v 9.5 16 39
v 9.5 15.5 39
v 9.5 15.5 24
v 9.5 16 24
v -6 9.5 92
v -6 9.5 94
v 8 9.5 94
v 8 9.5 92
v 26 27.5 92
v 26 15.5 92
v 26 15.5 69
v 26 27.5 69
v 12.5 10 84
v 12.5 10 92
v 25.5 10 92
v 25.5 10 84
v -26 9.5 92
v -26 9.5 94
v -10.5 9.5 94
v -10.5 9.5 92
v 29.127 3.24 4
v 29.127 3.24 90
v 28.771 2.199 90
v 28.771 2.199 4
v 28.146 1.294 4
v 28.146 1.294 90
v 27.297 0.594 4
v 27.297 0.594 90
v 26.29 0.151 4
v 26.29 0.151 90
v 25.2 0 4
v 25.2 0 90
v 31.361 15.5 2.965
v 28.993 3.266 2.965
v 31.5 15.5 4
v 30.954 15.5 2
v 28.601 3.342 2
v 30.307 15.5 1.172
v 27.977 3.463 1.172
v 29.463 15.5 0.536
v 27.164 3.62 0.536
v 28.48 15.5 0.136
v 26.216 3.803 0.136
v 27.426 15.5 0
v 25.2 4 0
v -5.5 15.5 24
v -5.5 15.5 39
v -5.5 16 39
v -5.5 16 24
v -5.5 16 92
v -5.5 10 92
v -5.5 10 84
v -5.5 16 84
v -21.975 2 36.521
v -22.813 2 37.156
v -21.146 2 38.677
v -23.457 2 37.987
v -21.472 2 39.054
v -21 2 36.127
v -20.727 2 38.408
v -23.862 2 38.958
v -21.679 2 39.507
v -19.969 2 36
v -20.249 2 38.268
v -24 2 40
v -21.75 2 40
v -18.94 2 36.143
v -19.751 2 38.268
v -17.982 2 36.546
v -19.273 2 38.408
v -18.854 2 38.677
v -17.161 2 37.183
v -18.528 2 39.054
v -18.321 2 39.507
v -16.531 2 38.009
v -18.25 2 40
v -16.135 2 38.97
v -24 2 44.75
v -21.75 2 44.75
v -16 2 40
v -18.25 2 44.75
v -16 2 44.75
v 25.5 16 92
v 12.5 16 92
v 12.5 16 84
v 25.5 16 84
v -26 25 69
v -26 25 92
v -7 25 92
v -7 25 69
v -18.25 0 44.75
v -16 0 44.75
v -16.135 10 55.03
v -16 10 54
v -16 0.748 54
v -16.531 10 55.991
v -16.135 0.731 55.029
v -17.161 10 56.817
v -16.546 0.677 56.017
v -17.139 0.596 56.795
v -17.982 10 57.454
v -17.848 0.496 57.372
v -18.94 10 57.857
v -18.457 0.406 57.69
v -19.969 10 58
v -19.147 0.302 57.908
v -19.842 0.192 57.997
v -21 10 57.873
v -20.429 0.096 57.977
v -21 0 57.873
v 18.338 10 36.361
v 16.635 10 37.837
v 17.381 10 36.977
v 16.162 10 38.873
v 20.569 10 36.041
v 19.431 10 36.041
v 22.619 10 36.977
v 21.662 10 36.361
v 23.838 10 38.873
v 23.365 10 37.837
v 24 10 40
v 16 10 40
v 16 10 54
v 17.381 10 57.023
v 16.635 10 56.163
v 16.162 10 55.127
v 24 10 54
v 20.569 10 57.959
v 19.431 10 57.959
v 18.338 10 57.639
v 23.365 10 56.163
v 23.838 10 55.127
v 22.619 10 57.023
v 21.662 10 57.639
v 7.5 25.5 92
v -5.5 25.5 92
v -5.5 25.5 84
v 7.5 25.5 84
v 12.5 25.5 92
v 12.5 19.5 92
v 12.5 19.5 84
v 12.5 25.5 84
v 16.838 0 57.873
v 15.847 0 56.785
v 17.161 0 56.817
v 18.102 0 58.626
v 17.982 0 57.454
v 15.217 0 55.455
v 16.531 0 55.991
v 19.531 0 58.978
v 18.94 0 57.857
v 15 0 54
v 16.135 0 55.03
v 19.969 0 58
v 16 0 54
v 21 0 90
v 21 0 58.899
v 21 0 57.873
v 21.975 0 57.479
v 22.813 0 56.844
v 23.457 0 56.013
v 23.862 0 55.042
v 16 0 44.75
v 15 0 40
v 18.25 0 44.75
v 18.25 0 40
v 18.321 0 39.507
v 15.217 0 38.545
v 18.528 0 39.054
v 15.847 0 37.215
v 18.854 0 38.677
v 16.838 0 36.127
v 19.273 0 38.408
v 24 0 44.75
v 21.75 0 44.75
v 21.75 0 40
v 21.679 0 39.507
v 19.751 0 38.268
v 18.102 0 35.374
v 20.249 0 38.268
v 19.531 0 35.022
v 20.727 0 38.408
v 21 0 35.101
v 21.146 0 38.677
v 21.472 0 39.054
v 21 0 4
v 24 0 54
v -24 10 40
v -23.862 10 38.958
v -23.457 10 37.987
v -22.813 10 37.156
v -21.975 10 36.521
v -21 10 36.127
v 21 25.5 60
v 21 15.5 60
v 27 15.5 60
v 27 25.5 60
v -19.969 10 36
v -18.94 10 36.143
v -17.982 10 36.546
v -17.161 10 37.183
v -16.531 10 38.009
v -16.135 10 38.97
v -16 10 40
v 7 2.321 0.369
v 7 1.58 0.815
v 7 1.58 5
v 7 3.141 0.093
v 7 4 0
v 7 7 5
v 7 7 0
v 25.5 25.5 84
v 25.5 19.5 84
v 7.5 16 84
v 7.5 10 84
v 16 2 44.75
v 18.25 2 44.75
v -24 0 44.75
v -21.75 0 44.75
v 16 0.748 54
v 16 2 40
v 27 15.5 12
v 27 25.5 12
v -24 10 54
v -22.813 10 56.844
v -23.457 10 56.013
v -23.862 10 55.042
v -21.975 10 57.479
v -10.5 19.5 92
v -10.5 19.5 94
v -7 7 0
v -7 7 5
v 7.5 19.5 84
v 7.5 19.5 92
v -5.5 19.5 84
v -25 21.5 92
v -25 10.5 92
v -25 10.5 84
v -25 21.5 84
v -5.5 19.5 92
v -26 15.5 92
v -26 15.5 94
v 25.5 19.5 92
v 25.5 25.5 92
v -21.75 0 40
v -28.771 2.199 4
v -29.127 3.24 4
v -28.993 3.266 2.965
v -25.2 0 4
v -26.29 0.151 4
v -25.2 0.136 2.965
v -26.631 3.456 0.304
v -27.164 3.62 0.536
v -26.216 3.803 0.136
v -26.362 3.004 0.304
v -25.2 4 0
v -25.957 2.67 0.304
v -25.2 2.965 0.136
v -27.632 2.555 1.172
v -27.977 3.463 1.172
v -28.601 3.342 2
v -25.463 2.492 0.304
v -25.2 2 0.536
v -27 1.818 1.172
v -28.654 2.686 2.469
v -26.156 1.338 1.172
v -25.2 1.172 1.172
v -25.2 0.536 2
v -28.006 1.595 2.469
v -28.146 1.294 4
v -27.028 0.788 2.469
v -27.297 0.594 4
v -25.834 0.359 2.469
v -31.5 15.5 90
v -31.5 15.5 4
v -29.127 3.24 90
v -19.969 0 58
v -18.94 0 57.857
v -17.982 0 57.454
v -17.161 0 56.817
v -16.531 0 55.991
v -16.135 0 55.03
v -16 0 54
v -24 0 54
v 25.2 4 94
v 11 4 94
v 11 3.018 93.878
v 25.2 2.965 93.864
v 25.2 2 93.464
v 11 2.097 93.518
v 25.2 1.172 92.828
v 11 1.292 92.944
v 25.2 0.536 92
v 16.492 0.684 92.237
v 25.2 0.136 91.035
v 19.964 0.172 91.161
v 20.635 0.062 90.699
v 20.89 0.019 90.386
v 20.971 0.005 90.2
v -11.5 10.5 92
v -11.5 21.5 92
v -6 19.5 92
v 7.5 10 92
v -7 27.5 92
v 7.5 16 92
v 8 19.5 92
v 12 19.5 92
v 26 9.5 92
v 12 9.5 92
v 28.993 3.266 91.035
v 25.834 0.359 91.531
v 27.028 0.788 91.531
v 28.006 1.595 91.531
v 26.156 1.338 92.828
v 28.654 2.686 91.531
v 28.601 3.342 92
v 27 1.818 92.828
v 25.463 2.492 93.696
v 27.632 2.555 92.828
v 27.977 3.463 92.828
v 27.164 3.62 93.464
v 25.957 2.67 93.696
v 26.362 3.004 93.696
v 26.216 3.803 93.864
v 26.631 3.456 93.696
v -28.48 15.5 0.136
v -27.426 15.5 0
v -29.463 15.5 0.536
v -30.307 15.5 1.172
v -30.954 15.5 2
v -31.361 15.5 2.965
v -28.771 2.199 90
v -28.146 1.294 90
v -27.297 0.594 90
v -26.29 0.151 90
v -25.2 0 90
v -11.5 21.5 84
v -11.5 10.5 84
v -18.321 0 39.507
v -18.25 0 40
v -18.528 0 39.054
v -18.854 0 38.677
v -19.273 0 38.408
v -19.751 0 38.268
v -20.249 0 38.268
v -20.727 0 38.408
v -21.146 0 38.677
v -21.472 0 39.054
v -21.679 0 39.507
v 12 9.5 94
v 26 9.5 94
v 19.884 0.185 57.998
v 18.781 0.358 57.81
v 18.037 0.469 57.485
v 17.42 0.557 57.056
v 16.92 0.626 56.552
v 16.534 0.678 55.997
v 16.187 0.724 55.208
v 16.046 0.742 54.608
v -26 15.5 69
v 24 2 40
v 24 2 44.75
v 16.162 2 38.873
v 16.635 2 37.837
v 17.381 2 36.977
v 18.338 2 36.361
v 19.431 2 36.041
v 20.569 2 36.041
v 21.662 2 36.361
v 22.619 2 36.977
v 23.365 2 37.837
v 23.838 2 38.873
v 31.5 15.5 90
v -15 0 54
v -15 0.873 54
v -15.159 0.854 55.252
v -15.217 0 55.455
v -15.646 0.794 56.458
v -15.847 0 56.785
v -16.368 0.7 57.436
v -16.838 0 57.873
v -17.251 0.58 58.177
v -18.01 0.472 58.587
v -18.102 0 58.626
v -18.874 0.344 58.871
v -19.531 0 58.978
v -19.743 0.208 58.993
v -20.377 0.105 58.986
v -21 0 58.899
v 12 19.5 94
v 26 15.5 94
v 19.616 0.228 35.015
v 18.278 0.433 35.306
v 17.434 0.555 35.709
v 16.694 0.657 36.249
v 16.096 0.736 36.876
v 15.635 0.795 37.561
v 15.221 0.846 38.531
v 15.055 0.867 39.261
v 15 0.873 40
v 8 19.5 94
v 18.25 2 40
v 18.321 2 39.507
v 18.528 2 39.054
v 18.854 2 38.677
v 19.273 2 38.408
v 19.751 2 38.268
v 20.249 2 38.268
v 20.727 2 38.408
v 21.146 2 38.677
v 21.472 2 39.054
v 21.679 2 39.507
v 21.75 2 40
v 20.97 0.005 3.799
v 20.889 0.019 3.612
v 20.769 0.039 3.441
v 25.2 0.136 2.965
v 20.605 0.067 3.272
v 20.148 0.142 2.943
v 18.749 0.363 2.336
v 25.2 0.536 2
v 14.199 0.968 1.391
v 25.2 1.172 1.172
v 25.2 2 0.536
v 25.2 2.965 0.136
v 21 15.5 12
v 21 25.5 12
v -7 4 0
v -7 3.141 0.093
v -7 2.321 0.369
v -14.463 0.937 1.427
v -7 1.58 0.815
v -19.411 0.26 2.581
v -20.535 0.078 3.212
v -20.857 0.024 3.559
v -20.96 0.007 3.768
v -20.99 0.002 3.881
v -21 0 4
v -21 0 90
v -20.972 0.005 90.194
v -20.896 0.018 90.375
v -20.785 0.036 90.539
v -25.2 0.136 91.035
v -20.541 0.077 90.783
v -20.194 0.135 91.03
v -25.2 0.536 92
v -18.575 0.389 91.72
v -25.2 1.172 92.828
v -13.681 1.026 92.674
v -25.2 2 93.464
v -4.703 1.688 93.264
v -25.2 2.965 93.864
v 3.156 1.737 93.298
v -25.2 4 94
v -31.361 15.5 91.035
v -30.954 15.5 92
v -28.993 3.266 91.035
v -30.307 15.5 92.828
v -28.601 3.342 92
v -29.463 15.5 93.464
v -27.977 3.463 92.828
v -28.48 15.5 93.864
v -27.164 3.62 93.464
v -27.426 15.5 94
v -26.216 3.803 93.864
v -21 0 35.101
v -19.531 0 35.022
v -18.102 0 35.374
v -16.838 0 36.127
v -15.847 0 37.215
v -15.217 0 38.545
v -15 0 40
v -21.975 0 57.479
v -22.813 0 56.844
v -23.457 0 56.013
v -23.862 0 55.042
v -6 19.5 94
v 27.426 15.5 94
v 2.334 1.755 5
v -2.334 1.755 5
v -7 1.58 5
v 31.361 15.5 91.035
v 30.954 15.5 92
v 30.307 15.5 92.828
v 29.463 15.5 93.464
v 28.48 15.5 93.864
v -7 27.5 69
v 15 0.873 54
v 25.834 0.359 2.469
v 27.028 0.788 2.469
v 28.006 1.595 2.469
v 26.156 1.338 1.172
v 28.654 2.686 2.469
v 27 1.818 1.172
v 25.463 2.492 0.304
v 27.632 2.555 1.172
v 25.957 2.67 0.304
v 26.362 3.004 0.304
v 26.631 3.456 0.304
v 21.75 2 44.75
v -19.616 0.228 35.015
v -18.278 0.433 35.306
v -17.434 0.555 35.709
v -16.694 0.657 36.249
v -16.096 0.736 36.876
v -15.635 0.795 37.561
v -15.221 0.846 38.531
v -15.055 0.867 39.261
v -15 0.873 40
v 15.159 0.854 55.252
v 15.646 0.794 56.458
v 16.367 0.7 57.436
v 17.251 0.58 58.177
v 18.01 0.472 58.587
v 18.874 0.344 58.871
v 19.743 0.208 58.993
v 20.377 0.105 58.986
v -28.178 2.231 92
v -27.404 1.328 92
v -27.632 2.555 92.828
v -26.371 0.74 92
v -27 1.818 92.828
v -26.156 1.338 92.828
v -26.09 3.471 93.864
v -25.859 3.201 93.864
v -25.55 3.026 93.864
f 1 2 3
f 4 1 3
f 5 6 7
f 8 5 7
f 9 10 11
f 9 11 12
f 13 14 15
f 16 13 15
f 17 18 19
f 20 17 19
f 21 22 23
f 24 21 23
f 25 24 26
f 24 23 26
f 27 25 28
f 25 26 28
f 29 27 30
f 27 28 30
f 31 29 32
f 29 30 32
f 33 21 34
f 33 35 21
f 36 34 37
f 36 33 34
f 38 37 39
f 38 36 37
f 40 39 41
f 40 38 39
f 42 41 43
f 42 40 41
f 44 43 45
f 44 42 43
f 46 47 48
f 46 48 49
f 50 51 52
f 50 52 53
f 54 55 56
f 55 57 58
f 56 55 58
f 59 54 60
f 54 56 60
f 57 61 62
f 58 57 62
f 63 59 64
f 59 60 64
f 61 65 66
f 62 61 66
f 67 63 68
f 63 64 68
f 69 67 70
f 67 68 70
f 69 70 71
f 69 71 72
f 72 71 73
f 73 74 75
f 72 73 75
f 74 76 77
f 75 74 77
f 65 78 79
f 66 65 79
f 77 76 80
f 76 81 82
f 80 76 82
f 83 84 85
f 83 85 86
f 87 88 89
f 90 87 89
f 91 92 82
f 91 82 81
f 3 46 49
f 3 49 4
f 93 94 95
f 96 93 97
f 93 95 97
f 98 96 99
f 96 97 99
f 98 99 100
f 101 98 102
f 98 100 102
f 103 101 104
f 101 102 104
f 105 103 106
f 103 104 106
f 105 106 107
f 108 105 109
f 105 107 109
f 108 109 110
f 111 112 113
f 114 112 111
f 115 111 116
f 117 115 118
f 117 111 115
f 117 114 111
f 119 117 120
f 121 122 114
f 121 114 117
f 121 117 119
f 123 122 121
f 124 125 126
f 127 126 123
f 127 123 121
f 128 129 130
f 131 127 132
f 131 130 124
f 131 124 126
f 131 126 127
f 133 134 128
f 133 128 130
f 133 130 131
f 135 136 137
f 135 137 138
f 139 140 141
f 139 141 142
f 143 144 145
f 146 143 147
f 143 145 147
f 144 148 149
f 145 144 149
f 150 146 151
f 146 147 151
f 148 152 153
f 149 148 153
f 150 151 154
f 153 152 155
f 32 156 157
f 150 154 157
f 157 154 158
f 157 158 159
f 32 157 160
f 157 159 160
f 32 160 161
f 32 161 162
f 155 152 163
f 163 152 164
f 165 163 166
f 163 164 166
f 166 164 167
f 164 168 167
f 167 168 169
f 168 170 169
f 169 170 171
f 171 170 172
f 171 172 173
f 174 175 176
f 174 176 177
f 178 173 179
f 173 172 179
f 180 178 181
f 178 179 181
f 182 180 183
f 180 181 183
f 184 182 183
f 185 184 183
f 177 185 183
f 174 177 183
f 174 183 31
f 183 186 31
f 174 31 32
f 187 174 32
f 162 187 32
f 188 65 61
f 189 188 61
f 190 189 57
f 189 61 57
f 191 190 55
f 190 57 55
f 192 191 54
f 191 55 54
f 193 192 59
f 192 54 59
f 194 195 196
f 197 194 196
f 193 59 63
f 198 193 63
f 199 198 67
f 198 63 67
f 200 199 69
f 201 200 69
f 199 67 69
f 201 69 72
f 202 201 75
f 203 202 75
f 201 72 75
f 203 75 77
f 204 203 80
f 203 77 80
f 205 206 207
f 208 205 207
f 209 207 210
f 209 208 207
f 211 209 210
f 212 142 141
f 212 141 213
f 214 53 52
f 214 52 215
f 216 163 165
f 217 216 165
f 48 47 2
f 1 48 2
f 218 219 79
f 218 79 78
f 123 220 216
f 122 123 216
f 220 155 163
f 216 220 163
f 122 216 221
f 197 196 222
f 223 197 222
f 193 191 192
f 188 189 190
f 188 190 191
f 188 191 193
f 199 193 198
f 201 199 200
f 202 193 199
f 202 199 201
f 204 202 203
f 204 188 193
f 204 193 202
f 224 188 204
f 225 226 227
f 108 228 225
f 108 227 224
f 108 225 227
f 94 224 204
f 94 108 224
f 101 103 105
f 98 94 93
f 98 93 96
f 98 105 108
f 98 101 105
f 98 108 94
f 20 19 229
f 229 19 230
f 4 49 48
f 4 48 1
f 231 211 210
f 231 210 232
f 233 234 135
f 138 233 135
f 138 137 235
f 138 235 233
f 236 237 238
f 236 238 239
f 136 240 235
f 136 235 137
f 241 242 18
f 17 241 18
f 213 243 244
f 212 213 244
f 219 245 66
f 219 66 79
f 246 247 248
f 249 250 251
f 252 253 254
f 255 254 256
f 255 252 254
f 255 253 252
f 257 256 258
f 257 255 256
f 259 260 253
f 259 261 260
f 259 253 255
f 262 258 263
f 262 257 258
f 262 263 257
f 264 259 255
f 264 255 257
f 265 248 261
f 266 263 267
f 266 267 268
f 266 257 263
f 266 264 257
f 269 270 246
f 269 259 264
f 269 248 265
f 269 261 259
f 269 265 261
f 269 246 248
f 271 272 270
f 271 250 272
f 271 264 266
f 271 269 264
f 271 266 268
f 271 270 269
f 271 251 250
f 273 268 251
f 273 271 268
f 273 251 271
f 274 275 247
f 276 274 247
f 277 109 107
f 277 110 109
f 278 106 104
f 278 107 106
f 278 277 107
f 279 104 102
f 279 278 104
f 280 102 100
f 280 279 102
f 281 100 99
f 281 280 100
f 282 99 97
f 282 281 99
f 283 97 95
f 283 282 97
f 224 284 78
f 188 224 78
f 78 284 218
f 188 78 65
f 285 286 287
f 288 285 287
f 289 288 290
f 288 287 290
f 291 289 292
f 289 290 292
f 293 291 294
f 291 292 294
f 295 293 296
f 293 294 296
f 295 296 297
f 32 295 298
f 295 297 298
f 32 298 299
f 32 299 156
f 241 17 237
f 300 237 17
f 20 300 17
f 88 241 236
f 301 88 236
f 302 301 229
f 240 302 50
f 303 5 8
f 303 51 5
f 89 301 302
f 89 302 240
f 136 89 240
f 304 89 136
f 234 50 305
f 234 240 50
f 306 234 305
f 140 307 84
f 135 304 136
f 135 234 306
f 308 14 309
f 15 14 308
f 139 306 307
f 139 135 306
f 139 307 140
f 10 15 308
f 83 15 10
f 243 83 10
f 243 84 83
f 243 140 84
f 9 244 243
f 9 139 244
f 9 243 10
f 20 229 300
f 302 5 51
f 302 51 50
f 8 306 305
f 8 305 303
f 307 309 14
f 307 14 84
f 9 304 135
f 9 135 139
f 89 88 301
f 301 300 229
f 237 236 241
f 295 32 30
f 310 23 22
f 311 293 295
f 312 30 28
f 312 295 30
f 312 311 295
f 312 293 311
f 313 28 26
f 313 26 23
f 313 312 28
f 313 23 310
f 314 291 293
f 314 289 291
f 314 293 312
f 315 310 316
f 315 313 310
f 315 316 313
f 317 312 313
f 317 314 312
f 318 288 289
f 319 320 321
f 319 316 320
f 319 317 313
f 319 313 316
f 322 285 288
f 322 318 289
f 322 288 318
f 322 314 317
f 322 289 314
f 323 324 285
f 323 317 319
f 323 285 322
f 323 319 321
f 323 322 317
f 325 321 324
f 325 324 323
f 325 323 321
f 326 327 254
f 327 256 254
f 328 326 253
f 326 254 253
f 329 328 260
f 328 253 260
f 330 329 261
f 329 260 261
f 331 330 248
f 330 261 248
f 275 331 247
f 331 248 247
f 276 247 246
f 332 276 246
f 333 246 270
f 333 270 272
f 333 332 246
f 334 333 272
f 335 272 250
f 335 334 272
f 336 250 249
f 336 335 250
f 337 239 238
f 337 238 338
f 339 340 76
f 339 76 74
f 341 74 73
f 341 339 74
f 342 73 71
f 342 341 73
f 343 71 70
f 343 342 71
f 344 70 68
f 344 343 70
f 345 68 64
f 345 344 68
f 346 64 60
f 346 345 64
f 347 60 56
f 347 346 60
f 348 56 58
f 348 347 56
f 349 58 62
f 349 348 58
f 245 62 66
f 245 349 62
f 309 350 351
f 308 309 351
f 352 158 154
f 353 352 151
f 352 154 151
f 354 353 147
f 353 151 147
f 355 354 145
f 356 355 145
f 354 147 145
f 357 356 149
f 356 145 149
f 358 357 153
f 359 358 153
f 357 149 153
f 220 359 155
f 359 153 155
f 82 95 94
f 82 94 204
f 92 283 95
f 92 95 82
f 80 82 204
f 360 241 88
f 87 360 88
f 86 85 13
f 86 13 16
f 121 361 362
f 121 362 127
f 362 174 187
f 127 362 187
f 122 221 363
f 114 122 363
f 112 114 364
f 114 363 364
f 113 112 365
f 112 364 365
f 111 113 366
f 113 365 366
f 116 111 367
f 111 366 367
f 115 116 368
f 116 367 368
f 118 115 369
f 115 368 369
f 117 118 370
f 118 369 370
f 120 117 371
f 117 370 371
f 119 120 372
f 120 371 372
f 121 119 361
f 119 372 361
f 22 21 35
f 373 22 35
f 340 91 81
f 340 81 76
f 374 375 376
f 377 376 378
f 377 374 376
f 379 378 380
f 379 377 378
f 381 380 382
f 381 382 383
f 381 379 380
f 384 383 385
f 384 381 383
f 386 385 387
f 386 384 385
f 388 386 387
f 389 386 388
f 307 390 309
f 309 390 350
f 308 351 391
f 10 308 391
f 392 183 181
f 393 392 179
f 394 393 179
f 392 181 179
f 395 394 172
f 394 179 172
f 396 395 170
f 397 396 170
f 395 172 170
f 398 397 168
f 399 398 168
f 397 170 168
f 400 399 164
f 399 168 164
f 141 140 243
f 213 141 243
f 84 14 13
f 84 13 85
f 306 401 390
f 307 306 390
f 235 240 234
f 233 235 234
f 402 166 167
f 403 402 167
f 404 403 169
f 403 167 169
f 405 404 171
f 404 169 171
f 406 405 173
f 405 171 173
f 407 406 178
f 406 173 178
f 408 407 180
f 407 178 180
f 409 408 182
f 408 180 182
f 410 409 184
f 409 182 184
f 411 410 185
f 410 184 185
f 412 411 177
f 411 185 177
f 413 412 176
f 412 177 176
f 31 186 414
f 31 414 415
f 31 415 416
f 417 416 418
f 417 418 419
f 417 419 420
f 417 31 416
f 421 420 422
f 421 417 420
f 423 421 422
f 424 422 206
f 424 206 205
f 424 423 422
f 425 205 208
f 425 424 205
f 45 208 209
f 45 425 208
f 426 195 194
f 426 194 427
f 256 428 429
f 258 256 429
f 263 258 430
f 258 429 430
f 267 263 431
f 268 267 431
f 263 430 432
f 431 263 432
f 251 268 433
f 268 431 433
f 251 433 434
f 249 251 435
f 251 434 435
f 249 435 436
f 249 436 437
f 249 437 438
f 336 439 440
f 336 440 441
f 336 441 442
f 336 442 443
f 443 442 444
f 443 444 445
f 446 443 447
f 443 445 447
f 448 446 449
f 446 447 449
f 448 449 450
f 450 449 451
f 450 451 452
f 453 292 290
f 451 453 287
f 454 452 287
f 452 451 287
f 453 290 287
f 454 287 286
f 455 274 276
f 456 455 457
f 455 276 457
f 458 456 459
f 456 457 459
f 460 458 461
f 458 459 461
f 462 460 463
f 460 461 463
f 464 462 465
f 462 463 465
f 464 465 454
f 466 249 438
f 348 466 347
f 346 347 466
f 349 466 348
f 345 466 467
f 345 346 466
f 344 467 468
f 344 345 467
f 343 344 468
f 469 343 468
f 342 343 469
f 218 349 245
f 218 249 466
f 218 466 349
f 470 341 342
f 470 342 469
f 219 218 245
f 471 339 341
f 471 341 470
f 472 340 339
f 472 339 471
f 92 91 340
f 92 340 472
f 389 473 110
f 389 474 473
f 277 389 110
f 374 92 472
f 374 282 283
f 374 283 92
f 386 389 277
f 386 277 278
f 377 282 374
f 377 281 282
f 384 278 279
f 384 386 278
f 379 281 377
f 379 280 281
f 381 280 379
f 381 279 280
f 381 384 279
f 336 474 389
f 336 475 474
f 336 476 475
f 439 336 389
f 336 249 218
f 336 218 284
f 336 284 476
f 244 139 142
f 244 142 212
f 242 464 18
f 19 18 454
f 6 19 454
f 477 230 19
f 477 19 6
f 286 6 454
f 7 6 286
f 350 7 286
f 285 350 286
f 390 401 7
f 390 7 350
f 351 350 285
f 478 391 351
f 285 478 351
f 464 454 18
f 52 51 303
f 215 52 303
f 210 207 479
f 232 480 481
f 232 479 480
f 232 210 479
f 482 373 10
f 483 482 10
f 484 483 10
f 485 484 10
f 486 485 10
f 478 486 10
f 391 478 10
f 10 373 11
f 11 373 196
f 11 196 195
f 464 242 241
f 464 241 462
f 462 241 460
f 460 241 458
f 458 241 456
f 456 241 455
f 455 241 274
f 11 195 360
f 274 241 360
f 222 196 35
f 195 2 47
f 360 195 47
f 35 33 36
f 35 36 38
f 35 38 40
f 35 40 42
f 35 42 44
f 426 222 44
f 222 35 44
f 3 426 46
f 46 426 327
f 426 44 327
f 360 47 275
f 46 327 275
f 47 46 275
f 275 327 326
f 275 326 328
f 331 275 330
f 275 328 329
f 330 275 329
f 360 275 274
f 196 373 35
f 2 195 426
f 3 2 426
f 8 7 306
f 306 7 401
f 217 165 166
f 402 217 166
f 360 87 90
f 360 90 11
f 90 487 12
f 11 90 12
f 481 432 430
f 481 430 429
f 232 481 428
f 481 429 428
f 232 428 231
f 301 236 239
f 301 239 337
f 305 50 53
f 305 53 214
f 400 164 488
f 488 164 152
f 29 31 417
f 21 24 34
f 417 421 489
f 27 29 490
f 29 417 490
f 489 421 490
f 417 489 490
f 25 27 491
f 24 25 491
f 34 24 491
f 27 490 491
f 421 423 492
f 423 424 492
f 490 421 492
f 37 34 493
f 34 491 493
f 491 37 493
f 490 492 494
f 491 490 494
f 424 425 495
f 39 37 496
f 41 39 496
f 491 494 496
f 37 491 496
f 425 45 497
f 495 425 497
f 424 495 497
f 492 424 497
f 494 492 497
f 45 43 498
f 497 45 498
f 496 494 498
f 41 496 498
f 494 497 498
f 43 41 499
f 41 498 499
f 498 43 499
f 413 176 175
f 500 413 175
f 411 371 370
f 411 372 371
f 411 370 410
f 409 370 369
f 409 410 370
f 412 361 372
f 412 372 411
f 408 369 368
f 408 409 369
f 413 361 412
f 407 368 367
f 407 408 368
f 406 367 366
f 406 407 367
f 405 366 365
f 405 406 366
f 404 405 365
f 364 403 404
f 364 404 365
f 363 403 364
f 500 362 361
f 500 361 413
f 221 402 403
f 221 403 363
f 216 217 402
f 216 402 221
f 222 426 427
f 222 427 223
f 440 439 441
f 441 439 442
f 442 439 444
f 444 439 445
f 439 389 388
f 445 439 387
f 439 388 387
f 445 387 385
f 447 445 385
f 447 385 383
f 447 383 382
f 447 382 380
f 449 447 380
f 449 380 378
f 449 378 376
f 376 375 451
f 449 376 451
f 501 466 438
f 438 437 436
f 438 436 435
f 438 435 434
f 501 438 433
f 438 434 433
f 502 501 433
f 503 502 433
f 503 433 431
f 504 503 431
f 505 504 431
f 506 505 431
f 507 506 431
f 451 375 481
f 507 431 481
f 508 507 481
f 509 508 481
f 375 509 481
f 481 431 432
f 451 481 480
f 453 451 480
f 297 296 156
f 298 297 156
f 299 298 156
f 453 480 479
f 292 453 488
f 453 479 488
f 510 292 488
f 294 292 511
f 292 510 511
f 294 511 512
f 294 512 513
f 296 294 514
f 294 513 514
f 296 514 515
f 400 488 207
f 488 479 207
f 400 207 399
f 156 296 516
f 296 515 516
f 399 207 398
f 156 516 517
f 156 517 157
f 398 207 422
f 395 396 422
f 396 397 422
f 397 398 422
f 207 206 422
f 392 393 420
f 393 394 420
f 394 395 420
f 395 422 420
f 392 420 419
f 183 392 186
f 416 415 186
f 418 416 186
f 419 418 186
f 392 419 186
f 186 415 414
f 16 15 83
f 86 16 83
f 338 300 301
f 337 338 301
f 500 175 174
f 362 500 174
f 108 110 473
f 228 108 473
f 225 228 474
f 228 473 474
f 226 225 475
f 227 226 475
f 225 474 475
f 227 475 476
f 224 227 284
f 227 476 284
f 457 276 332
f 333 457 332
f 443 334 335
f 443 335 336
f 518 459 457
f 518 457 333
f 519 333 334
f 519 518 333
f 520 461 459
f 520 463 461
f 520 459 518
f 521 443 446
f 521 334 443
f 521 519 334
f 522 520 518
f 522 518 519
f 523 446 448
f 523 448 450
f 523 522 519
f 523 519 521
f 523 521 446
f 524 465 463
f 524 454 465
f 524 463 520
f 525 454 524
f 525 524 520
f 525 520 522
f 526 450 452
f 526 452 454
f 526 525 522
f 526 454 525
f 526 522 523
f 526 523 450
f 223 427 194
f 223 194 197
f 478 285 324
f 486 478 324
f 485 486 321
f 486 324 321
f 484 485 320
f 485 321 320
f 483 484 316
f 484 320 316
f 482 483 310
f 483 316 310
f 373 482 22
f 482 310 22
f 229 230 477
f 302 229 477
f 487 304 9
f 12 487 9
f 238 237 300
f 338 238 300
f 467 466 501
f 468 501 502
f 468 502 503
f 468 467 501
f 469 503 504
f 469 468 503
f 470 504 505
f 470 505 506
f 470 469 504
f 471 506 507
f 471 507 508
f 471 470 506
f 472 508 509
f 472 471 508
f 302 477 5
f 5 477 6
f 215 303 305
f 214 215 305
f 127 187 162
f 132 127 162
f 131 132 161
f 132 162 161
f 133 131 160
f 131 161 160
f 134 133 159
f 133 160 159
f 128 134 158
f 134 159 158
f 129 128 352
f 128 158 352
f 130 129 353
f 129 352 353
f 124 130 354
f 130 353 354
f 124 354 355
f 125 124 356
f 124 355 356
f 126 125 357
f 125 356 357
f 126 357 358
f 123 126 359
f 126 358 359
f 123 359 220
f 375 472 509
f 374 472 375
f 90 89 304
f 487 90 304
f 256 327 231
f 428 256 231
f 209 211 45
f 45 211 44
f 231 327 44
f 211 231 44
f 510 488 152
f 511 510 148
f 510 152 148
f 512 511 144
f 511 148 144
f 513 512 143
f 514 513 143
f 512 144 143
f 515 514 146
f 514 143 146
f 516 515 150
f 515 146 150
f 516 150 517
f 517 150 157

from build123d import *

# Parameters (mm, degrees)
BOSS_EXTRUDE1_DEPTH = 94
SKETCH2_W           = 14
SKETCH2_H           = 14
CUT_EXTRUDE1_DEPTH  = 5
SKETCH3_W           = 52
SKETCH3_H           = 12
BOSS_EXTRUDE2_DEPTH = 25
SKETCH4_W           = 6
SKETCH4_H           = 48
BOSS_EXTRUDE3_DEPTH = 10
SKETCH5_W           = 13.5
SKETCH5_H           = 11
SKETCH5_W_2         = 13
SKETCH5_H_2         = 6
CUT_EXTRUDE2_DEPTH  = 10
CUT_EXTRUDE3_DEPTH  = 2
SKETCH7_W           = 19
SKETCH7_H           = 2.5
CUT_EXTRUDE4_DEPTH  = 102.056914657
SKETCH8_R           = 4
CUT_EXTRUDE5_DEPTH  = 10
BOSS_EXTRUDE5_DEPTH = 2
FILLET2_R           = 4
FILLET3_R           = 4
SKETCH10_W          = 15
SKETCH10_H          = 15
BOSS_EXTRUDE6_DEPTH = 0.5


# Some blends are built 0.0001 mm under size
with BuildPart() as part:
    # Sketch1 → Boss-Extrude1 (new body)
    with BuildSketch(Plane.XY):
        with BuildLine():
            Line((-31.5, 15.5), (-28.5, 0))
            Line((-28.5, 0), (-21, 0))
            ThreePointArc((-21, 0), (0, 1.776625594), (21, 0))
            Line((21, 0), (28.5, 0))
            Line((28.5, 0), (31.5, 15.5))
            Line((31.5, 15.5), (-31.5, 15.5))
        make_face()
    extrude(amount=BOSS_EXTRUDE1_DEPTH)

    # Sketch2 → Cut-Extrude1 (cut)
    with BuildSketch(Plane(origin=(0, 0, 0), x_dir=(-1, 0, 0), z_dir=(0, 0, -1))):
        Rectangle(SKETCH2_W, SKETCH2_H)
    extrude(amount=-CUT_EXTRUDE1_DEPTH, mode=Mode.SUBTRACT)

    # Sketch3 → Boss-Extrude2 (add)
    with BuildSketch(Plane.XY.offset(94)):
        with Locations((0, 21.5)):
            Rectangle(SKETCH3_W, SKETCH3_H)
    extrude(amount=-BOSS_EXTRUDE2_DEPTH)

    # Sketch4 → Boss-Extrude3 (add)
    with BuildSketch(Plane(origin=(0, 15.5, 0), x_dir=(1, 0, 0), z_dir=(0, 1, 0))):
        with Locations((24, -36)):
            Rectangle(SKETCH4_W, SKETCH4_H)
    extrude(amount=BOSS_EXTRUDE3_DEPTH)

    # Sketch5 → Cut-Extrude2 (cut)
    with BuildSketch(Plane.XY.offset(94)):
        with Locations((-18.25, 16)):
            Rectangle(SKETCH5_W, SKETCH5_H)
        with Locations((1, 22.5)):
            Rectangle(SKETCH5_W_2, SKETCH5_H_2)
        with Locations((19, 22.5)):
            Rectangle(SKETCH5_W_2, SKETCH5_H_2)
        with Locations((1, 13)):
            Rectangle(SKETCH5_W_2, SKETCH5_H_2)
        with Locations((19, 13)):
            Rectangle(SKETCH5_W_2, SKETCH5_H_2)
    extrude(amount=-CUT_EXTRUDE2_DEPTH, mode=Mode.SUBTRACT)

    # Sketch6 → Cut-Extrude3 (cut)
    with BuildSketch(Plane.XY.offset(94)):
        Polygon((-26, 15.5), (-26, 9.5), (-10.5, 9.5), (-10.5, 19.5), (-6, 19.5), (-6, 9.5), (8, 9.5), (8, 19.5), (12, 19.5), (12, 9.5), (26, 9.5), (26, 33.954249065), (-26, 33.954249065), align=None)
    extrude(amount=-CUT_EXTRUDE3_DEPTH, mode=Mode.SUBTRACT)

    # Sketch7 → Cut-Extrude4 (cut, through all)
    with BuildSketch(Plane.XY.offset(92)):
        with Locations((-16.5, 26.25)):
            Rectangle(SKETCH7_W, SKETCH7_H)
    extrude(amount=-CUT_EXTRUDE4_DEPTH, mode=Mode.SUBTRACT)

    # Sketch8 → Cut-Extrude5 (cut)
    with BuildSketch(Plane.XZ):
        with BuildLine():
            ThreePointArc((-21, 57.872983346), (-23.16227766, 56.449489743), (-24, 54))
            ThreePointArc((-24, 54), (-23.16227766, 51.550510257), (-21, 50.127016654))
            Line((-21, 50.127016654), (-21, 57.872983346))
        make_face()
        with BuildLine():
            ThreePointArc((-16, 54), (-17.550510257, 57.16227766), (-21, 57.872983346))
            Line((-21, 57.872983346), (-21, 50.127016654))
            ThreePointArc((-21, 50.127016654), (-17.550510257, 50.83772234), (-16, 54))
        make_face()
        with BuildLine():
            ThreePointArc((-21, 43.872983346), (-23.16227766, 42.449489743), (-24, 40))
            ThreePointArc((-24, 40), (-23.16227766, 37.550510257), (-21, 36.127016654))
            Line((-21, 36.127016654), (-21, 43.872983346))
        make_face()
        with BuildLine():
            ThreePointArc((-16, 40), (-17.550510257, 43.16227766), (-21, 43.872983346))
            Line((-21, 43.872983346), (-21, 36.127016654))
            ThreePointArc((-21, 36.127016654), (-17.550510257, 36.83772234), (-16, 40))
        make_face()
        with BuildLine():
            ThreePointArc((-16, 54), (-17.550510257, 50.83772234), (-21, 50.127016654))
            Line((-21, 50.127016654), (-21, 43.872983346))
            ThreePointArc((-21, 43.872983346), (-17.550510257, 43.16227766), (-16, 40))
            Line((-16, 40), (-16, 54))
        make_face()
        with BuildLine():
            ThreePointArc((-21, 50.127016654), (-23.16227766, 51.550510257), (-24, 54))
            Line((-24, 54), (-24, 40))
            ThreePointArc((-24, 40), (-23.16227766, 42.449489743), (-21, 43.872983346))
            Line((-21, 43.872983346), (-21, 50.127016654))
        make_face()
        with Locations((20, 54)):
            Circle(SKETCH8_R)
        with BuildLine():
            Line((24, 40), (24, 54))
            ThreePointArc((24, 54), (20, 50), (16, 54))
            Line((16, 54), (16, 40))
            ThreePointArc((16, 40), (20, 44), (24, 40))
        make_face()
        with Locations((20, 40)):
            Circle(SKETCH8_R)
    extrude(amount=-CUT_EXTRUDE5_DEPTH, mode=Mode.SUBTRACT)

    # Sketch9 → Boss-Extrude5 (add)
    with BuildSketch(Plane.XZ):
        with BuildLine():
            Line((-15, 40), (-15, 54))
            ThreePointArc((-15, 54), (-16.83772234, 57.872983346), (-21, 58.898979486))
            Line((-21, 58.898979486), (-21, 57.872983346))
            ThreePointArc((-21, 57.872983346), (-17.550510257, 57.16227766), (-16, 54))
            Line((-16, 54), (-16, 44.75))
            Line((-16, 44.75), (-18.25, 44.75))
            Line((-18.25, 44.75), (-18.25, 40))
            ThreePointArc((-18.25, 40), (-20, 38.25), (-21.75, 40))
            Line((-21.75, 40), (-21.75, 44.75))
            Line((-21.75, 44.75), (-25, 44.75))
            Line((-25, 44.75), (-25, 40))
            ThreePointArc((-25, 40), (-20, 35), (-15, 40))
        make_face()
        with BuildLine():
            Line((16, 44.75), (18.25, 44.75))
            Line((18.25, 44.75), (18.25, 40))
            ThreePointArc((18.25, 40), (20, 38.25), (21.75, 40))
            Line((21.75, 40), (21.75, 44.75))
            Line((21.75, 44.75), (25, 44.75))
            Line((25, 44.75), (25, 40))
            ThreePointArc((25, 40), (20, 35), (15, 40))
            Line((15, 40), (15, 54))
            ThreePointArc((15, 54), (16.83772234, 57.872983346), (21, 58.898979486))
            Line((21, 58.898979486), (21, 57.872983346))
            ThreePointArc((21, 57.872983346), (17.550510257, 57.16227766), (16, 54))
            Line((16, 54), (16, 44.75))
        make_face()
    extrude(amount=-BOSS_EXTRUDE5_DEPTH)

    # Fillet2
    fillet2_edges = [part.edges().sort_by_distance(p)[0] for p in [
        (-28.5, 0, 47),
        (28.5, 0, 47),
    ]]
    fillet(fillet2_edges, radius=FILLET2_R)

    # Fillet3
    fillet3_edges = [part.edges().sort_by_distance(p)[0] for p in [
        (30.313539907, 9.369956187, 0),
        (27.745510401, 0.914521876, 0),
        (23.099980206, 0, 0),
    ]]
    fillet(fillet3_edges, radius=FILLET3_R)
    fillet3_2_edges = [part.edges().sort_by_distance(p)[0] for p in [
        (-30.313539907, 9.369956187, 0),
        (-27.745510401, 0.914521876, 0),
        (-23.099980206, 0, 0),
    ]]
    fillet(fillet3_2_edges, radius=FILLET3_R)
    # the kernel refuses this fillet: 4 mm, written as the material it takes off along each edge
    with BuildSketch(Plane(origin=(29.127079814, 3.239912374, 94), x_dir=(0, 0, -1), z_dir=(0.19002190656586074, 0.9817798505902814, 0))) as fillet3_3_piece_1:
        with BuildLine():
            CenterArc((FILLET3_R, FILLET3_R), FILLET3_R, 180, 90)
            Line((0, FILLET3_R), (-FILLET3_R * 0.02, FILLET3_R))
            Line((-FILLET3_R * 0.02, FILLET3_R), (-FILLET3_R * 0.02, -FILLET3_R * 0.02))
            Line((-FILLET3_R * 0.02, -FILLET3_R * 0.02), (FILLET3_R, -FILLET3_R * 0.02))
            Line((FILLET3_R, -FILLET3_R * 0.02), (FILLET3_R, 0))
        make_face()
    extrude(amount=22.487613816, mode=Mode.SUBTRACT)
    with BuildSketch(Plane(origin=(25.199960412, 4, 94), x_dir=(0, -1, 0), z_dir=(-1, 0, 0))) as fillet3_3_piece_2:
        with BuildLine():
            CenterArc((4 - FILLET3_R, -FILLET3_R), FILLET3_R, 0, 90)
            Line((4, -FILLET3_R), (4 + FILLET3_R * 0.02, -FILLET3_R))
            Line((4 + FILLET3_R * 0.02, -FILLET3_R), (4 + FILLET3_R * 0.02, 0))
            Line((4 + FILLET3_R * 0.02, 0), (4, FILLET3_R * 0.02))
            Line((4, FILLET3_R * 0.02), (4 - FILLET3_R, FILLET3_R * 0.02))
            Line((4 - FILLET3_R, FILLET3_R * 0.02), (4 - FILLET3_R, 0))
        make_face()
    revolve(axis=Axis((25.199960412, 4, 94), (0, 0, 1)), revolution_arc=79.045937357, mode=Mode.SUBTRACT)
    with BuildSketch(Plane(origin=(11, 0, 94), x_dir=(0, 1, 0), z_dir=(1, 0, 0))) as fillet3_3_piece_3:
        with BuildLine():
            CenterArc((FILLET3_R, -FILLET3_R), FILLET3_R, 90, 90)
            Line((0, -FILLET3_R), (-FILLET3_R * 0.02, -FILLET3_R))
            Line((-FILLET3_R * 0.02, -FILLET3_R), (-FILLET3_R * 0.02, FILLET3_R * 0.02))
            Line((-FILLET3_R * 0.02, FILLET3_R * 0.02), (FILLET3_R, FILLET3_R * 0.02))
            Line((FILLET3_R, FILLET3_R * 0.02), (FILLET3_R, 0))
        make_face()
    extrude(amount=14.199960412, mode=Mode.SUBTRACT)
    fillet3_4_edges = [part.edges().sort_by_distance(p)[0] for p in [
        (-30.313539907, 9.369956187, 94),
        (-27.745510401, 0.914521876, 94),
        (-23.099980206, 0, 94),
    ]]
    fillet(fillet3_4_edges, radius=FILLET3_R - 0.0001)  # a hair under: the kernel refuses the full size

    # Sketch10 → Boss-Extrude6 (add)
    with BuildSketch(Plane(origin=(0, 15.5, 0), x_dir=(1, 0, 0), z_dir=(0, 1, 0))):
        with Locations((2, -31.5)):
            Rectangle(SKETCH10_W, SKETCH10_H)
    extrude(amount=BOSS_EXTRUDE6_DEPTH)


solid = part.part
